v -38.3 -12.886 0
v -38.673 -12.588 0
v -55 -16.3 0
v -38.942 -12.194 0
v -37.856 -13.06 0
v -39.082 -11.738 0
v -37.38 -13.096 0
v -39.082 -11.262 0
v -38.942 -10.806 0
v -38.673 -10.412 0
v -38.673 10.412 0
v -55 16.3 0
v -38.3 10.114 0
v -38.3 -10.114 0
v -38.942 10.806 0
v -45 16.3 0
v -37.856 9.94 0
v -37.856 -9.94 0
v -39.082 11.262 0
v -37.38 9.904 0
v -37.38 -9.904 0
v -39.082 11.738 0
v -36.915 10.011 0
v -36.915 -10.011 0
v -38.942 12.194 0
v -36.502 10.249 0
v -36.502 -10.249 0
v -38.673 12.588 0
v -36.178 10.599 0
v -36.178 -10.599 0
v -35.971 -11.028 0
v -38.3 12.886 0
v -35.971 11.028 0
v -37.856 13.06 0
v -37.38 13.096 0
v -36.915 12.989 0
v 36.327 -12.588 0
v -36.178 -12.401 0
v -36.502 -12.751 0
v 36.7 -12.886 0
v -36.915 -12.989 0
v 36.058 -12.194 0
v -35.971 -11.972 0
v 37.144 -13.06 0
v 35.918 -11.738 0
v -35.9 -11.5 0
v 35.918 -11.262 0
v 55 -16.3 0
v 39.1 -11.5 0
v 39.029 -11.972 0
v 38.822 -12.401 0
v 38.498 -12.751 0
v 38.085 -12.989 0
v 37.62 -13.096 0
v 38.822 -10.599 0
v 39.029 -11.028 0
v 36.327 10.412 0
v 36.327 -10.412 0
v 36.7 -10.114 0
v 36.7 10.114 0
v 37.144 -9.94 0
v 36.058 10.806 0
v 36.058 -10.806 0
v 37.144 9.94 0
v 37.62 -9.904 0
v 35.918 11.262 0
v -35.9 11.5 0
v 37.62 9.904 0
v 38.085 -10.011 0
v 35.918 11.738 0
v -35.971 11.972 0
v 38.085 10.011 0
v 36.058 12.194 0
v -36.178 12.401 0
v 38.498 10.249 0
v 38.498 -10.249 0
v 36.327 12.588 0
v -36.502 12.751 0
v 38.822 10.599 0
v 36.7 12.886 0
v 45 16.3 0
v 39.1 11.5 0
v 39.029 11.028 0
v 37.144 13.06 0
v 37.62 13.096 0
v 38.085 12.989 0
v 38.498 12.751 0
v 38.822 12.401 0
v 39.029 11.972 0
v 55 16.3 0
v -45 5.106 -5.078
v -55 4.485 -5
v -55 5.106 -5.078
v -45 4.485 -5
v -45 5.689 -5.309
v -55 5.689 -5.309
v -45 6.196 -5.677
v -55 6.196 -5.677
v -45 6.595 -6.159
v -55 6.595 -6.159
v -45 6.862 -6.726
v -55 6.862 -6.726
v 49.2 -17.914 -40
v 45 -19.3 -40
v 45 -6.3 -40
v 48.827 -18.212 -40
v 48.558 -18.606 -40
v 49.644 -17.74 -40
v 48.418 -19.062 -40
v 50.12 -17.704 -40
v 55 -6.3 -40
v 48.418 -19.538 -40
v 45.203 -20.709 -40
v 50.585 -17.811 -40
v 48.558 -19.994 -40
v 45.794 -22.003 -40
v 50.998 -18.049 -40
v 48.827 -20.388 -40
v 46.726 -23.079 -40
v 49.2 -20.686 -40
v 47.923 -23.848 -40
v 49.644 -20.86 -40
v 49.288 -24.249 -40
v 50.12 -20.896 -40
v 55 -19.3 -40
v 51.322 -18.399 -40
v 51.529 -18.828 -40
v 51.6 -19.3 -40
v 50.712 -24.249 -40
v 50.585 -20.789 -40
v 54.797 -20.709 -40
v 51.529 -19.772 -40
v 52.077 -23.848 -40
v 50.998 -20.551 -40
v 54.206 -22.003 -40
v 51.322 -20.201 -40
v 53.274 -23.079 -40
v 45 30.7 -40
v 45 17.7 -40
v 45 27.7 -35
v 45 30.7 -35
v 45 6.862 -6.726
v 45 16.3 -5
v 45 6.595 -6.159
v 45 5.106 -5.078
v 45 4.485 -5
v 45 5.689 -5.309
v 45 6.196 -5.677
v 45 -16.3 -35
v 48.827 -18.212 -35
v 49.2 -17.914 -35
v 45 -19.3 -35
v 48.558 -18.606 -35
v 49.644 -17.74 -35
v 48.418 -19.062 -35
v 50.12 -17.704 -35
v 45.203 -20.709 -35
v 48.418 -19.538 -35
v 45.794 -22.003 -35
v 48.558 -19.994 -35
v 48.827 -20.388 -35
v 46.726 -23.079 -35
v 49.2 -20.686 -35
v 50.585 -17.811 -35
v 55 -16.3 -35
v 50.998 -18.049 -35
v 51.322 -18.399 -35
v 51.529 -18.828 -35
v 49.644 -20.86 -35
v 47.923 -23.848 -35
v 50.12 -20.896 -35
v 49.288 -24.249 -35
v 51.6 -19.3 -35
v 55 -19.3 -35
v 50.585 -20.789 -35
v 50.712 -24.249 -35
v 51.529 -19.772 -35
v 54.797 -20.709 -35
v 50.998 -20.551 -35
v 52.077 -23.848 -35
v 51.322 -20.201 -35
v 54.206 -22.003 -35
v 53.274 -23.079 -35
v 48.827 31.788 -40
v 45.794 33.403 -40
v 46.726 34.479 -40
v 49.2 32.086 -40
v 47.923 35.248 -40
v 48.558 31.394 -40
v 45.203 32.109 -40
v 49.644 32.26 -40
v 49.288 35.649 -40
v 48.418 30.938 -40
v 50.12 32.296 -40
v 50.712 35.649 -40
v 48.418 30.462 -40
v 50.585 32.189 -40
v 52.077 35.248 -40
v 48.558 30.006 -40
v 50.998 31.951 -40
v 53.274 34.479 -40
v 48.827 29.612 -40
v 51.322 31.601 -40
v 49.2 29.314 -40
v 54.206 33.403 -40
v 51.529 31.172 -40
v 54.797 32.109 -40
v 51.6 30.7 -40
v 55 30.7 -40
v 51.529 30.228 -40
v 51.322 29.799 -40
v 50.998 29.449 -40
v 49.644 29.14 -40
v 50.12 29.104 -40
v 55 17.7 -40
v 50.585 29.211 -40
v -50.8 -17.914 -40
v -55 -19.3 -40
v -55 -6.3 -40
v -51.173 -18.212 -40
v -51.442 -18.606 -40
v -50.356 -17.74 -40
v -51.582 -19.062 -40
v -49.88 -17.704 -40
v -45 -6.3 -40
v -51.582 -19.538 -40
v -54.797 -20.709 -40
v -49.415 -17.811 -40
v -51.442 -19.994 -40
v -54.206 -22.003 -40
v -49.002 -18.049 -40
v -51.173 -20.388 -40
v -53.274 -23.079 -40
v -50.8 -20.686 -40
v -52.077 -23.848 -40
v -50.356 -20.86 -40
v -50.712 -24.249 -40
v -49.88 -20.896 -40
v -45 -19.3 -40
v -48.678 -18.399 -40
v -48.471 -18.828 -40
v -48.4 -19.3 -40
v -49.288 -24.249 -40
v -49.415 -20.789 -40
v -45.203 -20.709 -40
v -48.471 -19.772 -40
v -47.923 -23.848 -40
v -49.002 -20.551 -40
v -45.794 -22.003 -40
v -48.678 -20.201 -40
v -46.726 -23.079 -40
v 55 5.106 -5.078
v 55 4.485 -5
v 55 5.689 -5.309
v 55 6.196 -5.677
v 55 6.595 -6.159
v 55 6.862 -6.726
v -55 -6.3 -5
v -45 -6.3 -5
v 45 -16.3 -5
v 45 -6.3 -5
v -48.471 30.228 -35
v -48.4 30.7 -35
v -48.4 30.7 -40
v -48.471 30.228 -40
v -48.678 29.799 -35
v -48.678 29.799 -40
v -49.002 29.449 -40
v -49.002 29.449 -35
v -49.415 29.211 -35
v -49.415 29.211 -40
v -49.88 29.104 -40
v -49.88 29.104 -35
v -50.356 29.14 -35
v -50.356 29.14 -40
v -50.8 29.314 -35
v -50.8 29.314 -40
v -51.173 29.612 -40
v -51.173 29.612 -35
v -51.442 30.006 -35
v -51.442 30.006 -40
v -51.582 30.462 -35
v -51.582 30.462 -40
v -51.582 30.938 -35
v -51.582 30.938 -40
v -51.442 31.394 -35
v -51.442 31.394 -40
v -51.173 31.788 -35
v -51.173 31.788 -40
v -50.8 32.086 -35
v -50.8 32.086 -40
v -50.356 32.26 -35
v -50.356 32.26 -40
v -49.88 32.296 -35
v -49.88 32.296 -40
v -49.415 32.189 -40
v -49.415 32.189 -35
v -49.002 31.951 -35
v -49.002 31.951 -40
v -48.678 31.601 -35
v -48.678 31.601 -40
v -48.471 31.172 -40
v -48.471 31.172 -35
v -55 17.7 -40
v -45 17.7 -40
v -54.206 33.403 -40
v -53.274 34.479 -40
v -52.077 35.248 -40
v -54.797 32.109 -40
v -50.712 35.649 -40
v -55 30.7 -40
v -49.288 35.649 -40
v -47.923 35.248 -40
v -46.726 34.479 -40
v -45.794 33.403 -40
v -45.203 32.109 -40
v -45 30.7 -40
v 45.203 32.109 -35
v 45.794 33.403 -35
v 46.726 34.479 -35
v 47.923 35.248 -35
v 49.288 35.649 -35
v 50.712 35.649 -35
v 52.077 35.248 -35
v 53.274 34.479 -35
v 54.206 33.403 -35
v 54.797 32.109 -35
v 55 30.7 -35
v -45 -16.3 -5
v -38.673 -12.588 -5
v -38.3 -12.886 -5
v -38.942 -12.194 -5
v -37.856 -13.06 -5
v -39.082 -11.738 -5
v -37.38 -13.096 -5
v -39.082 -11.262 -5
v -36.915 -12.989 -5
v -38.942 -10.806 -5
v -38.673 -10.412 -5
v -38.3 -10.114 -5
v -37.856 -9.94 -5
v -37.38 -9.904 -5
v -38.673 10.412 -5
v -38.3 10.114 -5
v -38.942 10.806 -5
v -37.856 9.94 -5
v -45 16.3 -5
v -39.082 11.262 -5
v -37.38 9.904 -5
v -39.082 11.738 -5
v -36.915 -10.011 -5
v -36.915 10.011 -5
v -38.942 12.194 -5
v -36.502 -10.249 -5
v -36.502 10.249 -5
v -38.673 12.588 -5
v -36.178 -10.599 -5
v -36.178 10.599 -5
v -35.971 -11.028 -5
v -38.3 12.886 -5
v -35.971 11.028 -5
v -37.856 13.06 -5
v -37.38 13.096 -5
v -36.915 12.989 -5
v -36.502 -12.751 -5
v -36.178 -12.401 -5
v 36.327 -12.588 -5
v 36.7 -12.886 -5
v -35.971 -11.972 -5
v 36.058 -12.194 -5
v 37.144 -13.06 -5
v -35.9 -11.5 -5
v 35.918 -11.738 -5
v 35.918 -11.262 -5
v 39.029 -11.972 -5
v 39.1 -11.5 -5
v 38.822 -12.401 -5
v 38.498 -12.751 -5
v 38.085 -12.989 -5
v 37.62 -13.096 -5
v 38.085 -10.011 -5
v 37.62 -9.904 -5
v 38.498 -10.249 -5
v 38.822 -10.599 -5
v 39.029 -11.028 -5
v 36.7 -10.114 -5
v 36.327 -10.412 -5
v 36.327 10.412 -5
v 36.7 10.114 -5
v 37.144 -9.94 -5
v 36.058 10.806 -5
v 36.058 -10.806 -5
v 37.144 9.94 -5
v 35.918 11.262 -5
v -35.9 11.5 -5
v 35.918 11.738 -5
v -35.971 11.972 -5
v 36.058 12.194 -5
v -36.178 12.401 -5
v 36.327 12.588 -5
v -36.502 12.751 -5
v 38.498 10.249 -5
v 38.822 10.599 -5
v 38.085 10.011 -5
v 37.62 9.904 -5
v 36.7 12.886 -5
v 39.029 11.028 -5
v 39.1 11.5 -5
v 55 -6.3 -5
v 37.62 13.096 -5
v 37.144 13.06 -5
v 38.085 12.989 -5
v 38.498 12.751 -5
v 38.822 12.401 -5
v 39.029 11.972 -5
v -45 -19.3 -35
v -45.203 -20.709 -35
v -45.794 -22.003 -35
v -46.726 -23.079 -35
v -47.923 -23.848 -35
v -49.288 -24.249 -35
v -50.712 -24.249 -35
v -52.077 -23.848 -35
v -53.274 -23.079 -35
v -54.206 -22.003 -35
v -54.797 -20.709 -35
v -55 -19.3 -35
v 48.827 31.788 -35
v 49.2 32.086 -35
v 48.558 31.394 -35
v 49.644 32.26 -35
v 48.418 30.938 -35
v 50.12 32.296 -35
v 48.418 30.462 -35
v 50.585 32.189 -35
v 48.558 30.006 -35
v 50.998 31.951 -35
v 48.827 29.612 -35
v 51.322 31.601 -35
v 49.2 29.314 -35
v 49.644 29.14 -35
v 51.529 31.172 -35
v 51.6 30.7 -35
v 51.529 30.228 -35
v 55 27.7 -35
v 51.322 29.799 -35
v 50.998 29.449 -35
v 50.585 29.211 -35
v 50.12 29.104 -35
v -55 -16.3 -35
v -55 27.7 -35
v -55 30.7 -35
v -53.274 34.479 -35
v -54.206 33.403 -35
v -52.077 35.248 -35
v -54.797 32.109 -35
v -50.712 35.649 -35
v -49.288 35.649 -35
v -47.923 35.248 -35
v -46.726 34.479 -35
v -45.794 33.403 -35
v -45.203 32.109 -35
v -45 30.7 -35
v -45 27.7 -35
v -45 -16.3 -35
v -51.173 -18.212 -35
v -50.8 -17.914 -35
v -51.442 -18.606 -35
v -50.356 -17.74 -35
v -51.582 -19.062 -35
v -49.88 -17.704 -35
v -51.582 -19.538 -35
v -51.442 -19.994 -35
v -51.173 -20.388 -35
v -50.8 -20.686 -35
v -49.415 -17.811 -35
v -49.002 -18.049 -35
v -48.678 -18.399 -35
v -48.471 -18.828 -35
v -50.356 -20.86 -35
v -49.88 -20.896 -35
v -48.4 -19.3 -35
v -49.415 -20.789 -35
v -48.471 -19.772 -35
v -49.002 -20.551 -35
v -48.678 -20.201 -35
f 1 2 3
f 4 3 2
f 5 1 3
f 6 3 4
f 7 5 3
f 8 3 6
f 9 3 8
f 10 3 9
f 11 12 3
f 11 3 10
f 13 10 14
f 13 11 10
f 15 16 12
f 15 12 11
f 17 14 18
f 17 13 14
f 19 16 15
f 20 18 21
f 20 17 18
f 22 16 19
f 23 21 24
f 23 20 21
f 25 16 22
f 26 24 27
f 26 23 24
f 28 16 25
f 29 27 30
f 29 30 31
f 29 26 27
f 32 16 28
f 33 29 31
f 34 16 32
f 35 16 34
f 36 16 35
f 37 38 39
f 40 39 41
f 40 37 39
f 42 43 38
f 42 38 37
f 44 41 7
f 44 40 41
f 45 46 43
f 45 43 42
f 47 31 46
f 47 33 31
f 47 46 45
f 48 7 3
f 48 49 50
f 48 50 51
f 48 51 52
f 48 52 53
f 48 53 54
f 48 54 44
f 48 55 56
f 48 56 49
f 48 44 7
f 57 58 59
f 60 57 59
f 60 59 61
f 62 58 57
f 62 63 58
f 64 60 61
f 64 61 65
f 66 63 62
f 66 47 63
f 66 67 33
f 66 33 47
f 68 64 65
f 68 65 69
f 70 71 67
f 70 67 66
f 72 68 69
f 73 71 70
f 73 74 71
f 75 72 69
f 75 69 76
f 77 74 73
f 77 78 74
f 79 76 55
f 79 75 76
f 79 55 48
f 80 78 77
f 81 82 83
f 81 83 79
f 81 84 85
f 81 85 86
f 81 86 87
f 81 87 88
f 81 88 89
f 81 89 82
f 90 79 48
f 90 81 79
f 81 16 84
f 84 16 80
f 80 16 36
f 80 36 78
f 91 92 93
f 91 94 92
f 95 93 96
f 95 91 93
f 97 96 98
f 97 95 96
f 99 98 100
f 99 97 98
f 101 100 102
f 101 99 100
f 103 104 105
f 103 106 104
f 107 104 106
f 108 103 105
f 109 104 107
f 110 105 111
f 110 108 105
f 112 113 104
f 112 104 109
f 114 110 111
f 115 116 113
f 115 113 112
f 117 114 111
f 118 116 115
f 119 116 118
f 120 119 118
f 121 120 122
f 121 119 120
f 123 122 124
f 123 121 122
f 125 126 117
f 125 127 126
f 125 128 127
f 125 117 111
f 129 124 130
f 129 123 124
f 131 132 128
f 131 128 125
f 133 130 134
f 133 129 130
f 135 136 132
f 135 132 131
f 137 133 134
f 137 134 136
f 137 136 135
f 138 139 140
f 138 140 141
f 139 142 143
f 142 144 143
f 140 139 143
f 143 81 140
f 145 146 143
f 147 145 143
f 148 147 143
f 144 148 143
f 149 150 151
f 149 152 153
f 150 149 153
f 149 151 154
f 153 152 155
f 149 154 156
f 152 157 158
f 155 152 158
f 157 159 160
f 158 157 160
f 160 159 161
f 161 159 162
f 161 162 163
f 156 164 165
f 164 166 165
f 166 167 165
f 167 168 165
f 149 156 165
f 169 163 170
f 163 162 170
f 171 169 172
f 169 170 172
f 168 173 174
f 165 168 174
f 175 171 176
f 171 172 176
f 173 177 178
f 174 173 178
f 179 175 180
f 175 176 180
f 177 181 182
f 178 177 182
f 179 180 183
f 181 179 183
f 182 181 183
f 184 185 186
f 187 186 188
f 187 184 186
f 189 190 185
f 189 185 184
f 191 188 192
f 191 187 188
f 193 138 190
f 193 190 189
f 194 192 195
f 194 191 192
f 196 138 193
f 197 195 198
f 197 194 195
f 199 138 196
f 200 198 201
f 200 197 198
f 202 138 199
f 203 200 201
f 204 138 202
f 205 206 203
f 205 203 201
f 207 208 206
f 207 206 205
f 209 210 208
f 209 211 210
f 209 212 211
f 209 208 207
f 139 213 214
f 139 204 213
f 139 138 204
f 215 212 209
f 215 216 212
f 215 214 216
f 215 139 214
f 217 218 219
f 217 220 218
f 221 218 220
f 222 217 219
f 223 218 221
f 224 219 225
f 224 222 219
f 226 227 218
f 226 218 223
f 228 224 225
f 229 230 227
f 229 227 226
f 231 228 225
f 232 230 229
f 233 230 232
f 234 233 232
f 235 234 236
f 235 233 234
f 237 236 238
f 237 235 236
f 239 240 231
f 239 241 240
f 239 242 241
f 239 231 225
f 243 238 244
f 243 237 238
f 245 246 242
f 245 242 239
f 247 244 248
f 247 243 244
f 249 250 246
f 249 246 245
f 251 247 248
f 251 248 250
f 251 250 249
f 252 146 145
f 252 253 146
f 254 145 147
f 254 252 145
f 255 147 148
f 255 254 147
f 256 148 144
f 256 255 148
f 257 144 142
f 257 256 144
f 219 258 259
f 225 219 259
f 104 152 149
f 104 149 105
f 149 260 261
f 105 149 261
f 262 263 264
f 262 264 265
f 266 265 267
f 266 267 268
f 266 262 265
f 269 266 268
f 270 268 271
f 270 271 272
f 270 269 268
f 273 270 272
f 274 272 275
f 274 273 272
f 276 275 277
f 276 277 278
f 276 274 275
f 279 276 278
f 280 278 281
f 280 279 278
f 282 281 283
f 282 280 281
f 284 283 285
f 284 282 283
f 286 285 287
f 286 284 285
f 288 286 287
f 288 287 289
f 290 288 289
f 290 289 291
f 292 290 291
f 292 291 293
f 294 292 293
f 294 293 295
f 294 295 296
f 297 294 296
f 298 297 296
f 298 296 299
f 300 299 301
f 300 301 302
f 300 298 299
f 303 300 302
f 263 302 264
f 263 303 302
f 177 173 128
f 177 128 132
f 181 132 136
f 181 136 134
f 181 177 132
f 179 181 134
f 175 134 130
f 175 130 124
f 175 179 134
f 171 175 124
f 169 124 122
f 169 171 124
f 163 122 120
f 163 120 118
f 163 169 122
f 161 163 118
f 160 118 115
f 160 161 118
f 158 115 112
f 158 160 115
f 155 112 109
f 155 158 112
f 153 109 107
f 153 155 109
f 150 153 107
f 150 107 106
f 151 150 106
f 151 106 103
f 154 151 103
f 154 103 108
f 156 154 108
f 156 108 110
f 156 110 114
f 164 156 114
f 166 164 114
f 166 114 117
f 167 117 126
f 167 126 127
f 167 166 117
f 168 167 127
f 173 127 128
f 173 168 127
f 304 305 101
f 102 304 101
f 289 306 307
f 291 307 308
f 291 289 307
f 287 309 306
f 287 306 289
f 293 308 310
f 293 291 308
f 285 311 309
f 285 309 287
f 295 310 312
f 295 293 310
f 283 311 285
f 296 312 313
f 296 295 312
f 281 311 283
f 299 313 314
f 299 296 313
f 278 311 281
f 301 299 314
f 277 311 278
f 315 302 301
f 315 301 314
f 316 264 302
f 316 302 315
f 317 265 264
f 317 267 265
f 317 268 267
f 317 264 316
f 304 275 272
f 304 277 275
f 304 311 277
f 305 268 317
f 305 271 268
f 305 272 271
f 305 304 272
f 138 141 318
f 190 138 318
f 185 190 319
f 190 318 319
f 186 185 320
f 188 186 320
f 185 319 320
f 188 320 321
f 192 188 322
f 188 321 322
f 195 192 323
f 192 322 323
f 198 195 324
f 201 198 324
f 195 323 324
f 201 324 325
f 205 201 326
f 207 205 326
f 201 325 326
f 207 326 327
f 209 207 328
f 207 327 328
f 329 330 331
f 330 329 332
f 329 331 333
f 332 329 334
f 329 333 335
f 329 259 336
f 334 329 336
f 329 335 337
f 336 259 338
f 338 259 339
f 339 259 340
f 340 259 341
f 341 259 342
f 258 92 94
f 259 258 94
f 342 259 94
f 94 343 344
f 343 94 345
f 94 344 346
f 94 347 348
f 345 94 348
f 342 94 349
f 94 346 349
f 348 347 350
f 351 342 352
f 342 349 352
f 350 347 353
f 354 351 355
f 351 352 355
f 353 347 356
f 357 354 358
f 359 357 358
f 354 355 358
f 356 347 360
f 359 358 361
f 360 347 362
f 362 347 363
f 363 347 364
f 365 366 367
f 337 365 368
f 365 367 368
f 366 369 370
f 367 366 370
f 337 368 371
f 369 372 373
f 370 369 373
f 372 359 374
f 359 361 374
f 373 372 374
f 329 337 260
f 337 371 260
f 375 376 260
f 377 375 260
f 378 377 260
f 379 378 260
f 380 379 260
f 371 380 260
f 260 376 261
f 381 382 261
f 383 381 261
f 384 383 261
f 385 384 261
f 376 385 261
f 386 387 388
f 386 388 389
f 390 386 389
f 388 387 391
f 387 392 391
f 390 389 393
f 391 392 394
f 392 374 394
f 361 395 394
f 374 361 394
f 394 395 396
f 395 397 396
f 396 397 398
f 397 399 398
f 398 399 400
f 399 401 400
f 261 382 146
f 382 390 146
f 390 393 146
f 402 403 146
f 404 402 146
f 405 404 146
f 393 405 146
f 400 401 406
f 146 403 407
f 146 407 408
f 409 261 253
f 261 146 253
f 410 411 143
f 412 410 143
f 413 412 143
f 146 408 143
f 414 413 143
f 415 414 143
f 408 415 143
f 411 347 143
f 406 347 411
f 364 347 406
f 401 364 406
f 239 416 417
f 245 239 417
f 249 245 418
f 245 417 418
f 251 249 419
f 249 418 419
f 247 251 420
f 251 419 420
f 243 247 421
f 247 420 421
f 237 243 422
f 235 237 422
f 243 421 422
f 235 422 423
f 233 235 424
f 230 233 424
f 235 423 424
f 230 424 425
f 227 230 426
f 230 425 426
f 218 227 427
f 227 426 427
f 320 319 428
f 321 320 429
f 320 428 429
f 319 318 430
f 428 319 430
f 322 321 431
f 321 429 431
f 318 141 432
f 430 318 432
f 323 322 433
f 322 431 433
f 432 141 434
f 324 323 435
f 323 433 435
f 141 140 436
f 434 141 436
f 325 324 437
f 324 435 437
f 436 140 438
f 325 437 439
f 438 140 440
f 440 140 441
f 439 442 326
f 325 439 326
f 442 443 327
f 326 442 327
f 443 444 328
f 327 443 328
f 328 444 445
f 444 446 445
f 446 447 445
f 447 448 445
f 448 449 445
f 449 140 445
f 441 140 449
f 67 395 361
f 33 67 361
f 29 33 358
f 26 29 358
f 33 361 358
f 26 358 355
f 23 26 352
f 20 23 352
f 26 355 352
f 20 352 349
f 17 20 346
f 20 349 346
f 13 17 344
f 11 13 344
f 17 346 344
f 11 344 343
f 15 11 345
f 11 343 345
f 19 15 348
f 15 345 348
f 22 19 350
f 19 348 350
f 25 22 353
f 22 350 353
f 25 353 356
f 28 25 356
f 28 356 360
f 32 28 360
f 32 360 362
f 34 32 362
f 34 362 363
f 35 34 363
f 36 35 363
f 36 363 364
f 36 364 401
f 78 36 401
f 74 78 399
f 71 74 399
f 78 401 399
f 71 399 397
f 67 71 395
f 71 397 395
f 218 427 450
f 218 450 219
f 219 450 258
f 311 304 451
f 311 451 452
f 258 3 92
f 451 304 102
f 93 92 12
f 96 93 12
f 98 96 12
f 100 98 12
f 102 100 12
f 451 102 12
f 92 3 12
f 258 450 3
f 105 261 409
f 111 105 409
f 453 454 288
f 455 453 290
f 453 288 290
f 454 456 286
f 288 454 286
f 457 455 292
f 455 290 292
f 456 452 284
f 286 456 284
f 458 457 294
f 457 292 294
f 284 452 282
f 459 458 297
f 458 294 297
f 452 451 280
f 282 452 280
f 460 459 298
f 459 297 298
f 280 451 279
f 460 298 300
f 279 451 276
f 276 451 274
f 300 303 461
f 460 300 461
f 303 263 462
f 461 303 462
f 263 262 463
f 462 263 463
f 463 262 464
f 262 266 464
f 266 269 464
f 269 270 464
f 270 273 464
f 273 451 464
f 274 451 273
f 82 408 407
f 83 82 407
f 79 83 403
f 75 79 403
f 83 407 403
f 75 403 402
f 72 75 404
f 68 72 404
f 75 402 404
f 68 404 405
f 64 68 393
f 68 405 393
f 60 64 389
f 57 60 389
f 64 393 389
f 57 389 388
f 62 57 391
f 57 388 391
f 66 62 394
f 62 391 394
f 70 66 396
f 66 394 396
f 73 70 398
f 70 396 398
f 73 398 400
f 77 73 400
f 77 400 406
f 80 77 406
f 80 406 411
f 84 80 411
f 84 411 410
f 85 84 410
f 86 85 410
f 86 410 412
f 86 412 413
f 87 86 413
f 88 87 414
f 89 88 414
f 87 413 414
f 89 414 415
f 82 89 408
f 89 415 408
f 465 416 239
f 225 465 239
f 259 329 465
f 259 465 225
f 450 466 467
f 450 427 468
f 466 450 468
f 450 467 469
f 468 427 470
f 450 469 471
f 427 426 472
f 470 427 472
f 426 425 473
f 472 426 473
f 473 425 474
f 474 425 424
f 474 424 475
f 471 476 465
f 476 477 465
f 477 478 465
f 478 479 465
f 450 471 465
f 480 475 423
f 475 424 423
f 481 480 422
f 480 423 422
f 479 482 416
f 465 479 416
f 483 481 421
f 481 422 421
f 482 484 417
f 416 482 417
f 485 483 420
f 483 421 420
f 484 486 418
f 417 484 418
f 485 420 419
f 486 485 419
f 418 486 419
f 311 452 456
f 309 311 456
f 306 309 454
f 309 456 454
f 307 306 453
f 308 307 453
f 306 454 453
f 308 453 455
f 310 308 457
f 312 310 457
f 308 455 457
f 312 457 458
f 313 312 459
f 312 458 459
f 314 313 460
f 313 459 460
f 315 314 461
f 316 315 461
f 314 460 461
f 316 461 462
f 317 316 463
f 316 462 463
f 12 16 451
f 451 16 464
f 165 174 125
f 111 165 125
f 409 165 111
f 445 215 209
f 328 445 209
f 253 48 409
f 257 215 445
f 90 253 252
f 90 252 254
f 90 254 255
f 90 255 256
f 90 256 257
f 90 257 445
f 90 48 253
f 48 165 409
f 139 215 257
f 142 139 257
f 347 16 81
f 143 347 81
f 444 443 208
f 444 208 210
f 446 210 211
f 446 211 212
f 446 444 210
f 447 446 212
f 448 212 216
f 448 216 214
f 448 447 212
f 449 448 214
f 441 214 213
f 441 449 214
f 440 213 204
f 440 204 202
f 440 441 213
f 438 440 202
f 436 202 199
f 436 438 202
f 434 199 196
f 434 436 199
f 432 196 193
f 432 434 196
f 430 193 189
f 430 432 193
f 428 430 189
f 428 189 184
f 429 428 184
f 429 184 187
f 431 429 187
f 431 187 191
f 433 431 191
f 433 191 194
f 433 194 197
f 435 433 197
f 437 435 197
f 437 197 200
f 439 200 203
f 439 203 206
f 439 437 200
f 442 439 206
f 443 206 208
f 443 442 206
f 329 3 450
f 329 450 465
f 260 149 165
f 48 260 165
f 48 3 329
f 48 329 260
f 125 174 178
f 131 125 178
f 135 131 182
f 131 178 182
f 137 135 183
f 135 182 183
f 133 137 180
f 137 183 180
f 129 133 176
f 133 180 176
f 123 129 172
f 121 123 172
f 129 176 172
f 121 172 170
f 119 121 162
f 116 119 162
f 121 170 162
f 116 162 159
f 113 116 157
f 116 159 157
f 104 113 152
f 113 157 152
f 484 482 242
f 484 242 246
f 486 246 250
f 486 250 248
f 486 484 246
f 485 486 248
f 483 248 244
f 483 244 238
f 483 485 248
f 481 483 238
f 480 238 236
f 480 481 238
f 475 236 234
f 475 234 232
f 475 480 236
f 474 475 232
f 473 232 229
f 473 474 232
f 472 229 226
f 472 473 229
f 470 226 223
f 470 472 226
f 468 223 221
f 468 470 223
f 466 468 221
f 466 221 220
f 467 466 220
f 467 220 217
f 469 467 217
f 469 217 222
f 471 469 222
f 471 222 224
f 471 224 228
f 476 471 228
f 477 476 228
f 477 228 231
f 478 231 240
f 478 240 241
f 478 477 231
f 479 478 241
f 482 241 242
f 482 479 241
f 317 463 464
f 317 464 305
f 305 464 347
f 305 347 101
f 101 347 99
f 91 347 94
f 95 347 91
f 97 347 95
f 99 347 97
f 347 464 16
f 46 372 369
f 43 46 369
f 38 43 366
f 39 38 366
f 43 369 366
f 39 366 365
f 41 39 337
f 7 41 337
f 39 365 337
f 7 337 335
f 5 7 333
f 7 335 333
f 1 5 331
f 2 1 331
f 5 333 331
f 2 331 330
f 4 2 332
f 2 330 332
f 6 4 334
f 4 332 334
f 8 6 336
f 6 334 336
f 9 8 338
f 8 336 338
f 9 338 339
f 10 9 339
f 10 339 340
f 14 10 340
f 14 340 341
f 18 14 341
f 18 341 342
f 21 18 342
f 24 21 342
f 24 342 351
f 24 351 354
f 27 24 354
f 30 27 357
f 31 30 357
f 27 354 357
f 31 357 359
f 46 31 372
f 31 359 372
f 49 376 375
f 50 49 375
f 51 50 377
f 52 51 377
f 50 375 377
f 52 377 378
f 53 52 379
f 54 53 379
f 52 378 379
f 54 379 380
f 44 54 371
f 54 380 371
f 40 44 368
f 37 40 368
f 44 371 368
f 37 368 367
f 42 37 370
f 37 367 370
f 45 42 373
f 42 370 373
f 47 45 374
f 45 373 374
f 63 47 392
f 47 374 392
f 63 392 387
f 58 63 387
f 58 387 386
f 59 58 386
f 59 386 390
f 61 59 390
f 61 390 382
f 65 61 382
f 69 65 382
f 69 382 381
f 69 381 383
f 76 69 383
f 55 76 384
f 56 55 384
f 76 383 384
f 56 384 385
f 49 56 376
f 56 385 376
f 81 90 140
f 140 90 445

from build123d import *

# Parameters (mm, degrees)
SKETCH038_W      = 110
SKETCH038_H      = 32.6
PAD020_DEPTH     = 5
SKETCH039_R      = 1.6
POCKET018_DEPTH  = 5
SKETCH040_W      = 10
SKETCH040_H      = 21.4
SKETCH040_H_2    = 10
PAD021_DEPTH     = 35
MIRROREDSKETCH_R = 1.6
PAD022_DEPTH     = 5
POCKET019_DEPTH  = 110
FILLET012_R      = 2.5


with BuildPart() as part:
    # Sketch038 → Pad020 (new body)
    with BuildSketch(Plane.XY):
        Rectangle(SKETCH038_W, SKETCH038_H)
    extrude(amount=-PAD020_DEPTH)

    # Sketch039 (on Face6 of Pad020) → Pocket018 (cut)
    with BuildSketch(Plane(origin=(0, 0, -5), x_dir=(1, 0, 0), z_dir=(0, 0, -1))):
        with Locations((-37.5, 11.5)):
            Circle(SKETCH039_R)
        with Locations((-37.5, -11.5)):
            Circle(SKETCH039_R)
        with Locations((37.5, -11.5)):
            Circle(SKETCH039_R)
        with Locations((37.5, 11.5)):
            Circle(SKETCH039_R)
    extrude(amount=-POCKET018_DEPTH, mode=Mode.SUBTRACT)

    # Sketch040 (on Face4 of Pocket018) → Pad021 (join)
    with BuildSketch(Plane.XY):
        with Locations((-50, 17)):
            Rectangle(SKETCH040_W, SKETCH040_H)
        with Locations((50, 17)):
            Rectangle(SKETCH040_W, SKETCH040_H)
        with Locations((50, -11.3)):
            Rectangle(SKETCH040_W, SKETCH040_H_2)
        with Locations((-50, -11.3)):
            Rectangle(SKETCH040_W, SKETCH040_H_2)
    extrude(amount=-PAD021_DEPTH)

    # MirroredSketch (on Face35 of Pad021) → Pad022 (join)
    with BuildSketch(Plane(origin=(0, 0, -35), x_dir=(1, 0, 0), z_dir=(0, 0, -1))):
        with BuildLine():
            Line((-45, -27.7), (-45, -6.3))
            Line((-45, -6.3), (-55, -6.3))
            Line((-55, -6.3), (-55, -27.7))
            Line((-55, -27.7), (-55, -30.7))
            ThreePointArc((-55, -30.7), (-50, -35.7), (-45, -30.7))
            Line((-45, -27.7), (-45, -30.7))
        make_face()
        with Locations((-50, -30.7)):
            Circle(MIRROREDSKETCH_R, mode=Mode.SUBTRACT)
        with BuildLine():
            Line((55, -27.7), (55, -6.3))
            Line((55, -6.3), (45, -6.3))
            Line((45, -6.3), (45, -27.7))
            Line((45, -27.7), (45, -30.7))
            ThreePointArc((45, -30.7), (49.999989, -35.7), (55, -30.700021))
            Line((55, -27.7), (55, -30.700021))
        make_face()
        with Locations((50, -30.7)):
            Circle(MIRROREDSKETCH_R, mode=Mode.SUBTRACT)
        with BuildLine():
            Line((45, 6.3), (55, 6.3))
            Line((55, 6.3), (55, 16.3))
            Line((55, 16.3), (55, 19.3))
            ThreePointArc((55, 19.3), (50, 24.3), (45, 19.3))
            Line((45, 16.3), (45, 19.3))
            Line((45, 16.3), (45, 6.3))
        make_face()
        with Locations((50, 19.3)):
            Circle(MIRROREDSKETCH_R, mode=Mode.SUBTRACT)
        with BuildLine():
            Line((-55, 6.3), (-45, 6.3))
            Line((-45, 6.3), (-45, 16.3))
            Line((-45, 16.3), (-45, 19.3))
            ThreePointArc((-45, 19.3), (-50, 24.3), (-55, 19.3))
            Line((-55, 16.3), (-55, 19.3))
            Line((-55, 16.3), (-55, 6.3))
        make_face()
        with Locations((-50, 19.3)):
            Circle(MIRROREDSKETCH_R, mode=Mode.SUBTRACT)
    extrude(amount=PAD022_DEPTH)

    # Sketch041 (on Face44 of Pad022) → Pocket019 (cut)
    with BuildSketch(Plane.YZ.offset(55)):
        Polygon((16.3, 0), (27.7, -35), (27.7, 0), align=None)
        Polygon((17.7, -40), (6.3, -5), (6.3, -40), align=None)
    extrude(amount=-POCKET019_DEPTH, mode=Mode.SUBTRACT)

    # Fillet012
    fillet012_edges = [part.edges().sort_by_distance(p)[0] for p in [
        (-50, 6.3, -5),
        (50, 6.3, -5),
    ]]
    fillet(fillet012_edges, radius=FILLET012_R)


solid = part.part
